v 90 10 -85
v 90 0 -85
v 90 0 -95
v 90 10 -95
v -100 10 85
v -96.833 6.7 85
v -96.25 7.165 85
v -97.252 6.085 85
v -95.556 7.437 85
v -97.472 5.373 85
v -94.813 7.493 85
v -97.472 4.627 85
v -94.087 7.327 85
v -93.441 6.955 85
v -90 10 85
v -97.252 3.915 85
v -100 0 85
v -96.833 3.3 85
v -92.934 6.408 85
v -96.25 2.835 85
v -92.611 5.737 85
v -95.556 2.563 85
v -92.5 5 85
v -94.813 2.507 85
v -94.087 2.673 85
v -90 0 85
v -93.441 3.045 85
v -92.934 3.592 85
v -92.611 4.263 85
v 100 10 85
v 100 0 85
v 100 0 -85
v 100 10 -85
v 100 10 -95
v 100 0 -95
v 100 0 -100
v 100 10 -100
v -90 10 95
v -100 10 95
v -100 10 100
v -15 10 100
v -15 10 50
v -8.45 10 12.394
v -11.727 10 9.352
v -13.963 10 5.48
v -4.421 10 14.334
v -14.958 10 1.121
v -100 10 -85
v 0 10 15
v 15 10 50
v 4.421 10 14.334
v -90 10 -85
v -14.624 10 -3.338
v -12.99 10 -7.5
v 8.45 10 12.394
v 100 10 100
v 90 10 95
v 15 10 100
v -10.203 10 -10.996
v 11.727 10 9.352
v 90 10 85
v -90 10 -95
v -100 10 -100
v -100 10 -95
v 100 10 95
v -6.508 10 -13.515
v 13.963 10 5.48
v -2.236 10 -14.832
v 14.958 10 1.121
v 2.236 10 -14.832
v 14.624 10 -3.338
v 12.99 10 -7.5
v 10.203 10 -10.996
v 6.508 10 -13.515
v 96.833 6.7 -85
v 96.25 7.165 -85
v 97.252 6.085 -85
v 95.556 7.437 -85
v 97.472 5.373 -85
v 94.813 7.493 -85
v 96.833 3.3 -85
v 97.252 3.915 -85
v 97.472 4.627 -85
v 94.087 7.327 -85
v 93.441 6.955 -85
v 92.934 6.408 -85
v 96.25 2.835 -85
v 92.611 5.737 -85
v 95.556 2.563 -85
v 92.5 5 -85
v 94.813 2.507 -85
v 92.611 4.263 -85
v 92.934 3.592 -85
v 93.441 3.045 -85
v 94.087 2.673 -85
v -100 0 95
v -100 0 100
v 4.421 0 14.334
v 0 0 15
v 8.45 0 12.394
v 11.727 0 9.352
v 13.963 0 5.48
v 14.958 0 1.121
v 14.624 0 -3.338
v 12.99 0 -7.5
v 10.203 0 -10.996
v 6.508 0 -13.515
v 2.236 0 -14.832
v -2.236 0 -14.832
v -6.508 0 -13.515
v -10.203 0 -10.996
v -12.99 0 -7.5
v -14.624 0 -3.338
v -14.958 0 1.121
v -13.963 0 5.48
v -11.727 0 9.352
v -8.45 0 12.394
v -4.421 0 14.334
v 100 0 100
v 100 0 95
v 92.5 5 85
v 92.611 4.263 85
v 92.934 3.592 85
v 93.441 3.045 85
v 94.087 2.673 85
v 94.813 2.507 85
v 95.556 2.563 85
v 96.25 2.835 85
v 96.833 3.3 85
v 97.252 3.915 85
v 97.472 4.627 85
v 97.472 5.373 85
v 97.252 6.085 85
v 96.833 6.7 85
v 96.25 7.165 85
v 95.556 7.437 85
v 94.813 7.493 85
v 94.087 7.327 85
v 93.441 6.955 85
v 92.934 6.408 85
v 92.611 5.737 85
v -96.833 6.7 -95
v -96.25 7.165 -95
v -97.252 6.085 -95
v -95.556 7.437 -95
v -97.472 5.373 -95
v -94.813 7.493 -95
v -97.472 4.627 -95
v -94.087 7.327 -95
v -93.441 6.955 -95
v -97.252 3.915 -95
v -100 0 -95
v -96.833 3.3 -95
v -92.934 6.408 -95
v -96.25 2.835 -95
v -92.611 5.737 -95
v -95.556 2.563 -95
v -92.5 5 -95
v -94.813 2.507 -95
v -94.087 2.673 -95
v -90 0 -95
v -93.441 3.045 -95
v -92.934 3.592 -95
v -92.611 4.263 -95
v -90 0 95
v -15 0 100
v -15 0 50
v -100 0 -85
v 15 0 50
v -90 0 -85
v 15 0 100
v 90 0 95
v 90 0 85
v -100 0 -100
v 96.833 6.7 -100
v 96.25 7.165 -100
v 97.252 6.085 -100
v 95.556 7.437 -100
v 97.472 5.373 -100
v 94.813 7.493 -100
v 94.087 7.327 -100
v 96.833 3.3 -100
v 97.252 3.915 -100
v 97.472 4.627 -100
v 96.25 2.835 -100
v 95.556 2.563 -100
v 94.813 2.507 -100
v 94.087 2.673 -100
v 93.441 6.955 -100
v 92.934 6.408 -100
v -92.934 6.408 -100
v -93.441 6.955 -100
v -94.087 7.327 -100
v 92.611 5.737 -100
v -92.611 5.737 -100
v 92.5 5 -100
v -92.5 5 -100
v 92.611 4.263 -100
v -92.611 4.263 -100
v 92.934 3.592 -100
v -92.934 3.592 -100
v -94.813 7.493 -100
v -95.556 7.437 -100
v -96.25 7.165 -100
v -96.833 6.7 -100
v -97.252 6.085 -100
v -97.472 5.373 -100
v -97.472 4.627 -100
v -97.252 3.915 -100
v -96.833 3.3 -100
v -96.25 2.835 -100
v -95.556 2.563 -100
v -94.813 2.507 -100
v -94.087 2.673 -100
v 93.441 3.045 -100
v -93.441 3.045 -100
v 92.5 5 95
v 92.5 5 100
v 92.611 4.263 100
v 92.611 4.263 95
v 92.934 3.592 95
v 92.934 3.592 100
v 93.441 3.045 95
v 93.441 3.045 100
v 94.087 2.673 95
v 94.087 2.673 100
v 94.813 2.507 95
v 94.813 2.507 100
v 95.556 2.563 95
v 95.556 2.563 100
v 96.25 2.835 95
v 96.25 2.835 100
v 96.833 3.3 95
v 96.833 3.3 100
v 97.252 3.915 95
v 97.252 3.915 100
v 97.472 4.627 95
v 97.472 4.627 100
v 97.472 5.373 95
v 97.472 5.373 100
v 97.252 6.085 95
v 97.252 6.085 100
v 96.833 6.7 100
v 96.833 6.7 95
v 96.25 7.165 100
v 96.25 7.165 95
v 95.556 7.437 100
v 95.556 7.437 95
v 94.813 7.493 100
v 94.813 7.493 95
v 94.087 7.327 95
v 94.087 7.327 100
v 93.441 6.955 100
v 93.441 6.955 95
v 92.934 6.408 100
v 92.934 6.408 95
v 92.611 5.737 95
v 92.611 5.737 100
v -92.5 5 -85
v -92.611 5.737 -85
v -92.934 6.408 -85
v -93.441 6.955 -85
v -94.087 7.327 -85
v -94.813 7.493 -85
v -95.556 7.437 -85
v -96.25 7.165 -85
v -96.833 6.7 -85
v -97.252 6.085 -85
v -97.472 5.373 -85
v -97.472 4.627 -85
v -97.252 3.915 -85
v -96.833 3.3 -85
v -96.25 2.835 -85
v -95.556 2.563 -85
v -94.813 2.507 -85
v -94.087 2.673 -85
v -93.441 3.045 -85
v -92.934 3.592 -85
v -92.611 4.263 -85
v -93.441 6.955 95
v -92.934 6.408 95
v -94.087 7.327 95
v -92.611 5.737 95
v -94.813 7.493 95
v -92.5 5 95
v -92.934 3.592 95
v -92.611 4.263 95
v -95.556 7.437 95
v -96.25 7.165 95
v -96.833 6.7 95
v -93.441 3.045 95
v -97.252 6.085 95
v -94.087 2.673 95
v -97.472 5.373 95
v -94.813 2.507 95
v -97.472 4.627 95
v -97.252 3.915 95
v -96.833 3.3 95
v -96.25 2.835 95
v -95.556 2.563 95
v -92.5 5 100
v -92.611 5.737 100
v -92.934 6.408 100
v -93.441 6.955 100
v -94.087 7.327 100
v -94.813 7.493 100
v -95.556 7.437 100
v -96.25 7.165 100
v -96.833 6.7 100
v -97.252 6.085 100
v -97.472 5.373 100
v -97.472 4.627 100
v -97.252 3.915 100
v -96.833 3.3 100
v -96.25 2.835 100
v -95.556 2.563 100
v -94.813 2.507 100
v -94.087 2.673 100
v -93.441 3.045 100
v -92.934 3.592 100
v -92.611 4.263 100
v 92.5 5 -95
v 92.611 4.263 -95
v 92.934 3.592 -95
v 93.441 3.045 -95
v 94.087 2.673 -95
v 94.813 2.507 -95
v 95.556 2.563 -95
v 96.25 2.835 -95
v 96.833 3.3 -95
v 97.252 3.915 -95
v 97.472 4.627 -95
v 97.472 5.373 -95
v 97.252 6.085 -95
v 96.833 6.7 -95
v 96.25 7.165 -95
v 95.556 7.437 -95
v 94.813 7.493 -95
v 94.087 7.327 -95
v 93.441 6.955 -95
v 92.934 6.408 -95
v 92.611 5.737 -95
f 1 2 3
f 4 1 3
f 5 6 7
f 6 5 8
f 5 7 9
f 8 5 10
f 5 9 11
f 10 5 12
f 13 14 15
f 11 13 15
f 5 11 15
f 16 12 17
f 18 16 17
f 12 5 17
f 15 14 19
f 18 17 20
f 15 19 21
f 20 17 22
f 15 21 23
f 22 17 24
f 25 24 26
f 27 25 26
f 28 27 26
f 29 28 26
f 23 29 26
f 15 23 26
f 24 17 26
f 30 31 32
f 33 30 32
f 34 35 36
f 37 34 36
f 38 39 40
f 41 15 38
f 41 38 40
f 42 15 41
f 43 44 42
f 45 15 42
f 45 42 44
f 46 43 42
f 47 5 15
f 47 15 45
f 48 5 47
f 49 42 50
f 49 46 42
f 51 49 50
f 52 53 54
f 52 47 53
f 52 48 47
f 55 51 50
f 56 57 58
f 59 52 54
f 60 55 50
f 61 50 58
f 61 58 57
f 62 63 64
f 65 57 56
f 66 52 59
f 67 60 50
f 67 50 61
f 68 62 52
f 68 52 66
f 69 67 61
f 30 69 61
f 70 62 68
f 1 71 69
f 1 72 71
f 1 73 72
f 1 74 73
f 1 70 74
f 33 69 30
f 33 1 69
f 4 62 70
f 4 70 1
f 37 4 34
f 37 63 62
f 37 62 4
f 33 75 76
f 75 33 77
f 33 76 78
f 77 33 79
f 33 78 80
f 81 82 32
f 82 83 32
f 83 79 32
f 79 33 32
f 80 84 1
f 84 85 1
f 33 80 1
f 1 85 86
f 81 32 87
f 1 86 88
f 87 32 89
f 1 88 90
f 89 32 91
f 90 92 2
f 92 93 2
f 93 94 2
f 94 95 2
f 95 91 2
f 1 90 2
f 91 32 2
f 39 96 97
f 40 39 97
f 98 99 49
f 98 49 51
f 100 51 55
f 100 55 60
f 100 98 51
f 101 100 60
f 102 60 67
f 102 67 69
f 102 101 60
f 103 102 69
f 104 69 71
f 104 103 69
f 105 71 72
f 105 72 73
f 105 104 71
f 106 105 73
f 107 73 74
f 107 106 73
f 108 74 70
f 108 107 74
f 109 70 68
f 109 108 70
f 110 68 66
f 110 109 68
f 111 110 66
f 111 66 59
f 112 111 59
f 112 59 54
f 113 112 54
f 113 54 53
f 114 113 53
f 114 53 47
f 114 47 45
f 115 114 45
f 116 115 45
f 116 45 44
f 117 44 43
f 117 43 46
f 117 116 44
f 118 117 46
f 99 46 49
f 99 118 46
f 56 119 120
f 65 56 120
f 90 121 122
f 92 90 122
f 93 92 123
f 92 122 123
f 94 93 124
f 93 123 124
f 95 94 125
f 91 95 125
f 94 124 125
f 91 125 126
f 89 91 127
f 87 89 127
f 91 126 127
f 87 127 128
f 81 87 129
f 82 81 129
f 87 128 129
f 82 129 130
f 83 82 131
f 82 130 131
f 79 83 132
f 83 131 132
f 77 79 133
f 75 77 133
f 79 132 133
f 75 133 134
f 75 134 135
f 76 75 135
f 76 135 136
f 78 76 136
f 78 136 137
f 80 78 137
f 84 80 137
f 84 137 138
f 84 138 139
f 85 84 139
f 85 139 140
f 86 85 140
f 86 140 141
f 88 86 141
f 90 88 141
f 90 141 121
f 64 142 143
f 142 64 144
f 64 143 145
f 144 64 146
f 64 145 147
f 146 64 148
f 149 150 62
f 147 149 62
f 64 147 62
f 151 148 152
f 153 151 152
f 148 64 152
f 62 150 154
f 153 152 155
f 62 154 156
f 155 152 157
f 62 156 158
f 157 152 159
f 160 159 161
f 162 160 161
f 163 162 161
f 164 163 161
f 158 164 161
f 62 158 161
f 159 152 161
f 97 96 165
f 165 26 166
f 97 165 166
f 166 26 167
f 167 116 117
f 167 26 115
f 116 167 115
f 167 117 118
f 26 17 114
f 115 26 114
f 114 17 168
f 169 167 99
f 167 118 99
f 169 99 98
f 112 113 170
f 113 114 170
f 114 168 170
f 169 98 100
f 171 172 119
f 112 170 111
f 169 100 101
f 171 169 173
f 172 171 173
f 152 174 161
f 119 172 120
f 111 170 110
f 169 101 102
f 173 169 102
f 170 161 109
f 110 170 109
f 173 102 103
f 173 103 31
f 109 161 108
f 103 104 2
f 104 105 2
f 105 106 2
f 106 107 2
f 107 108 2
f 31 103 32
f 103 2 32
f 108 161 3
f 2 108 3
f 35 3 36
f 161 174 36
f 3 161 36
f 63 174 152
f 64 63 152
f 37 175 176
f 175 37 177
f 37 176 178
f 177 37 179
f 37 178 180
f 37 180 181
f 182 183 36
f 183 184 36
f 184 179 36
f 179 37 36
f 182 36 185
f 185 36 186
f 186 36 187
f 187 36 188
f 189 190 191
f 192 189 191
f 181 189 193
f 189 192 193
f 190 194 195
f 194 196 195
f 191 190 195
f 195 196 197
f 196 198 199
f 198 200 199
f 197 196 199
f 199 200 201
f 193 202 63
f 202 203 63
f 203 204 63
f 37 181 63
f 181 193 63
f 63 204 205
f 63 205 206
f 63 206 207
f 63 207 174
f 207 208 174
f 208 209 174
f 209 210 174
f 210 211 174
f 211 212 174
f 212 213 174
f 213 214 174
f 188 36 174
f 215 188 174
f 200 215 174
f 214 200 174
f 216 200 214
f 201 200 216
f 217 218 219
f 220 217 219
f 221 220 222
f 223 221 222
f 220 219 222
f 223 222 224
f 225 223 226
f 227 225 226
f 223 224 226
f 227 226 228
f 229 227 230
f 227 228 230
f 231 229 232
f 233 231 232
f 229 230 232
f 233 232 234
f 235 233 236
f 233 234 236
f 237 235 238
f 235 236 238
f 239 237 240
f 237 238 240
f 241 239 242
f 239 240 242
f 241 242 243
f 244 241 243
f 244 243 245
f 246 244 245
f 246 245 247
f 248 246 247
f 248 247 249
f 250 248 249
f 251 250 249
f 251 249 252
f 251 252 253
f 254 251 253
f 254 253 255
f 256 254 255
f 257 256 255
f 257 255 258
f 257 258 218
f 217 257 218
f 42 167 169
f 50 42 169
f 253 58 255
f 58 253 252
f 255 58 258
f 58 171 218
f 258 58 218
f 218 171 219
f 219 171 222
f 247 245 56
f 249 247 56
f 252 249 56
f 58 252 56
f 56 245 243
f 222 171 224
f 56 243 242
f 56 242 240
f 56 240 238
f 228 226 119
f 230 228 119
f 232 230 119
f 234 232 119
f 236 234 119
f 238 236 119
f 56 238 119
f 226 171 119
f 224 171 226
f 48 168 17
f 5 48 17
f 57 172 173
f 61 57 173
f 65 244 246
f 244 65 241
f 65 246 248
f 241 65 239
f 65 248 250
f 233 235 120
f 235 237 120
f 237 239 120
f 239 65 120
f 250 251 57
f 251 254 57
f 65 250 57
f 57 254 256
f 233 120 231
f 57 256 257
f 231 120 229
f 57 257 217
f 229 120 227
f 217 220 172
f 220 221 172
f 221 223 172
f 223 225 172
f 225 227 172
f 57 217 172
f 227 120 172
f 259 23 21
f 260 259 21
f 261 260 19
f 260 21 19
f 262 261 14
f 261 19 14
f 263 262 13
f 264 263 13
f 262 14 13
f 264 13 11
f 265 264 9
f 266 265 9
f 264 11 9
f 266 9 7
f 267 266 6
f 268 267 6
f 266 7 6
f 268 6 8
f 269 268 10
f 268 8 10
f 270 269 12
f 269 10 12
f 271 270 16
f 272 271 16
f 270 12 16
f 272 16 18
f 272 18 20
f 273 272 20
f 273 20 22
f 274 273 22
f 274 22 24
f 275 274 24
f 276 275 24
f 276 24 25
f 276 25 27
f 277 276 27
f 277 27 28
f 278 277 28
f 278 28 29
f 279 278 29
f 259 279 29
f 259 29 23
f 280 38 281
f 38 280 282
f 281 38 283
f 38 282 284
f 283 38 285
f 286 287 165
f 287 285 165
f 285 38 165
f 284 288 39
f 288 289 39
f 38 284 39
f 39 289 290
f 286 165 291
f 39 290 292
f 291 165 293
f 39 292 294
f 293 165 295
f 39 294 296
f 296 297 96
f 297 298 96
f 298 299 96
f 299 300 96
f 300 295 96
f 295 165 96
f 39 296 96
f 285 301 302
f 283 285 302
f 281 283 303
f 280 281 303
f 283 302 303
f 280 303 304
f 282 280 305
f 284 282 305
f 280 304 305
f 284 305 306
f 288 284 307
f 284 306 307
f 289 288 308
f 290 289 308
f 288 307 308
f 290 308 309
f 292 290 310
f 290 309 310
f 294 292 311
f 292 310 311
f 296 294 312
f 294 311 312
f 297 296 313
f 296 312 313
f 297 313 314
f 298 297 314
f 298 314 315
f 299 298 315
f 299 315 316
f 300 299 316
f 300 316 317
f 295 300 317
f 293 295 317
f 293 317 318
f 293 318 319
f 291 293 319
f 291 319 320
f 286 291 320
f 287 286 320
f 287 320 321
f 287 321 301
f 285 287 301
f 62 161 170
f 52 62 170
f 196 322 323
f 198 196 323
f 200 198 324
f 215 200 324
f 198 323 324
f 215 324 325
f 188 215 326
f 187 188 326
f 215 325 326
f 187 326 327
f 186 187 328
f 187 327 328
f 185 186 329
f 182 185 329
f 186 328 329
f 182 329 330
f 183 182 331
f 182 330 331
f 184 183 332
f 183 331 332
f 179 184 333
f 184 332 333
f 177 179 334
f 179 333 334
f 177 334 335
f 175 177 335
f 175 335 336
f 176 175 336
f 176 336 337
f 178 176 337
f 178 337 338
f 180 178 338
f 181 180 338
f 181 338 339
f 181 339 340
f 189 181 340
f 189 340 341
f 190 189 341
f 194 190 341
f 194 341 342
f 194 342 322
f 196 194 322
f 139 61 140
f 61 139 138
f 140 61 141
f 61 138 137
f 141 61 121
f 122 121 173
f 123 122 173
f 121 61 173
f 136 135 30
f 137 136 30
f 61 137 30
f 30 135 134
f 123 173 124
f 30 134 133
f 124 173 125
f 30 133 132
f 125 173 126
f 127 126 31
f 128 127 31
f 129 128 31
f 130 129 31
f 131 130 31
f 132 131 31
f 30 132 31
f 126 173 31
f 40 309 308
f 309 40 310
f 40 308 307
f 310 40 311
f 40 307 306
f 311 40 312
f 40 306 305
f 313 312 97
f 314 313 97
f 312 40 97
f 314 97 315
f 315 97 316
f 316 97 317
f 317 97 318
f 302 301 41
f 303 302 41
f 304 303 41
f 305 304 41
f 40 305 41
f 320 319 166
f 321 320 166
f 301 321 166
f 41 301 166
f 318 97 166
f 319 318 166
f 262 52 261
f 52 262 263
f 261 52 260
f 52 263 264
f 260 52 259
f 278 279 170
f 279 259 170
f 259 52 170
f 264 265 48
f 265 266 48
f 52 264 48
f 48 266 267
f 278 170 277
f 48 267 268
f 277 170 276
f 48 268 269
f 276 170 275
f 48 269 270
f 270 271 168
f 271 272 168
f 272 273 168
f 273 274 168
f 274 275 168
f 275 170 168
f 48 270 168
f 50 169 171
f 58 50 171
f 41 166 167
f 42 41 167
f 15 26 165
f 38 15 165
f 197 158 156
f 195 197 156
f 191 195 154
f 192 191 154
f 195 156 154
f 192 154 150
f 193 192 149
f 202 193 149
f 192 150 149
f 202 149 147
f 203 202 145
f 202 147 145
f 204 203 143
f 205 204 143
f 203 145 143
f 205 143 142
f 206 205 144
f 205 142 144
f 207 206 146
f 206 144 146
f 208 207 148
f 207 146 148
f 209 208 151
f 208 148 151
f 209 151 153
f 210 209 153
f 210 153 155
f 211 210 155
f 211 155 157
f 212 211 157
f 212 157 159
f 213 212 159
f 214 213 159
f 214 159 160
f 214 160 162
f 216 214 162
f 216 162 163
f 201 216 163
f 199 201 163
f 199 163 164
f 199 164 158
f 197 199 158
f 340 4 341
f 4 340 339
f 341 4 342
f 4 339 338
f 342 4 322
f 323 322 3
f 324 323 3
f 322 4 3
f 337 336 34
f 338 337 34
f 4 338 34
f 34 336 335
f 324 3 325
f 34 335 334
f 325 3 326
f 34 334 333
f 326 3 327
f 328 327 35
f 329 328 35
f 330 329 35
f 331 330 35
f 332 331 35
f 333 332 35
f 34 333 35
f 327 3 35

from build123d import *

# Parameters (mm, degrees)
ESQUISSE1_R             = 15
BASE_DEPTH              = 10
ESQUISSE2_R             = 2.5
ENL_V_MAT_EXTRU_1_DEPTH = 224.830292856


with BuildPart() as part:
    # Esquisse1 → BASE (new body)
    with BuildSketch(Plane(origin=(0, 0, 0), x_dir=(1, 0, 0), z_dir=(0, 1, 0))):
        Polygon((-100, 95), (-90, 95), (-90, 85), (-100, 85), (-100, -85), (-90, -85), (-90, -95), (-100, -95), (-100, -100), (-15, -100), (-15, -50), (15, -50), (15, -100), (100, -100), (100, -95), (90, -95), (90, -85), (100, -85), (100, 85), (90, 85), (90, 95), (100, 95), (100, 100), (-100, 100), align=None)
        with Locations(Location((0, 0, 0), (0, 0, 270))):
            Circle(ESQUISSE1_R, mode=Mode.SUBTRACT)
    extrude(amount=BASE_DEPTH)

    # Esquisse2 → Enlèv. mat.-Extru.1 (cut, through all)
    with BuildSketch(Plane.XY.offset(100)):
        with Locations((-95, 5)):
            Circle(ESQUISSE2_R)
        with Locations(Location((95, 5, 0), (0, 0, 180))):
            Circle(ESQUISSE2_R)
    extrude(amount=-ENL_V_MAT_EXTRU_1_DEPTH, mode=Mode.SUBTRACT)


solid = part.part
